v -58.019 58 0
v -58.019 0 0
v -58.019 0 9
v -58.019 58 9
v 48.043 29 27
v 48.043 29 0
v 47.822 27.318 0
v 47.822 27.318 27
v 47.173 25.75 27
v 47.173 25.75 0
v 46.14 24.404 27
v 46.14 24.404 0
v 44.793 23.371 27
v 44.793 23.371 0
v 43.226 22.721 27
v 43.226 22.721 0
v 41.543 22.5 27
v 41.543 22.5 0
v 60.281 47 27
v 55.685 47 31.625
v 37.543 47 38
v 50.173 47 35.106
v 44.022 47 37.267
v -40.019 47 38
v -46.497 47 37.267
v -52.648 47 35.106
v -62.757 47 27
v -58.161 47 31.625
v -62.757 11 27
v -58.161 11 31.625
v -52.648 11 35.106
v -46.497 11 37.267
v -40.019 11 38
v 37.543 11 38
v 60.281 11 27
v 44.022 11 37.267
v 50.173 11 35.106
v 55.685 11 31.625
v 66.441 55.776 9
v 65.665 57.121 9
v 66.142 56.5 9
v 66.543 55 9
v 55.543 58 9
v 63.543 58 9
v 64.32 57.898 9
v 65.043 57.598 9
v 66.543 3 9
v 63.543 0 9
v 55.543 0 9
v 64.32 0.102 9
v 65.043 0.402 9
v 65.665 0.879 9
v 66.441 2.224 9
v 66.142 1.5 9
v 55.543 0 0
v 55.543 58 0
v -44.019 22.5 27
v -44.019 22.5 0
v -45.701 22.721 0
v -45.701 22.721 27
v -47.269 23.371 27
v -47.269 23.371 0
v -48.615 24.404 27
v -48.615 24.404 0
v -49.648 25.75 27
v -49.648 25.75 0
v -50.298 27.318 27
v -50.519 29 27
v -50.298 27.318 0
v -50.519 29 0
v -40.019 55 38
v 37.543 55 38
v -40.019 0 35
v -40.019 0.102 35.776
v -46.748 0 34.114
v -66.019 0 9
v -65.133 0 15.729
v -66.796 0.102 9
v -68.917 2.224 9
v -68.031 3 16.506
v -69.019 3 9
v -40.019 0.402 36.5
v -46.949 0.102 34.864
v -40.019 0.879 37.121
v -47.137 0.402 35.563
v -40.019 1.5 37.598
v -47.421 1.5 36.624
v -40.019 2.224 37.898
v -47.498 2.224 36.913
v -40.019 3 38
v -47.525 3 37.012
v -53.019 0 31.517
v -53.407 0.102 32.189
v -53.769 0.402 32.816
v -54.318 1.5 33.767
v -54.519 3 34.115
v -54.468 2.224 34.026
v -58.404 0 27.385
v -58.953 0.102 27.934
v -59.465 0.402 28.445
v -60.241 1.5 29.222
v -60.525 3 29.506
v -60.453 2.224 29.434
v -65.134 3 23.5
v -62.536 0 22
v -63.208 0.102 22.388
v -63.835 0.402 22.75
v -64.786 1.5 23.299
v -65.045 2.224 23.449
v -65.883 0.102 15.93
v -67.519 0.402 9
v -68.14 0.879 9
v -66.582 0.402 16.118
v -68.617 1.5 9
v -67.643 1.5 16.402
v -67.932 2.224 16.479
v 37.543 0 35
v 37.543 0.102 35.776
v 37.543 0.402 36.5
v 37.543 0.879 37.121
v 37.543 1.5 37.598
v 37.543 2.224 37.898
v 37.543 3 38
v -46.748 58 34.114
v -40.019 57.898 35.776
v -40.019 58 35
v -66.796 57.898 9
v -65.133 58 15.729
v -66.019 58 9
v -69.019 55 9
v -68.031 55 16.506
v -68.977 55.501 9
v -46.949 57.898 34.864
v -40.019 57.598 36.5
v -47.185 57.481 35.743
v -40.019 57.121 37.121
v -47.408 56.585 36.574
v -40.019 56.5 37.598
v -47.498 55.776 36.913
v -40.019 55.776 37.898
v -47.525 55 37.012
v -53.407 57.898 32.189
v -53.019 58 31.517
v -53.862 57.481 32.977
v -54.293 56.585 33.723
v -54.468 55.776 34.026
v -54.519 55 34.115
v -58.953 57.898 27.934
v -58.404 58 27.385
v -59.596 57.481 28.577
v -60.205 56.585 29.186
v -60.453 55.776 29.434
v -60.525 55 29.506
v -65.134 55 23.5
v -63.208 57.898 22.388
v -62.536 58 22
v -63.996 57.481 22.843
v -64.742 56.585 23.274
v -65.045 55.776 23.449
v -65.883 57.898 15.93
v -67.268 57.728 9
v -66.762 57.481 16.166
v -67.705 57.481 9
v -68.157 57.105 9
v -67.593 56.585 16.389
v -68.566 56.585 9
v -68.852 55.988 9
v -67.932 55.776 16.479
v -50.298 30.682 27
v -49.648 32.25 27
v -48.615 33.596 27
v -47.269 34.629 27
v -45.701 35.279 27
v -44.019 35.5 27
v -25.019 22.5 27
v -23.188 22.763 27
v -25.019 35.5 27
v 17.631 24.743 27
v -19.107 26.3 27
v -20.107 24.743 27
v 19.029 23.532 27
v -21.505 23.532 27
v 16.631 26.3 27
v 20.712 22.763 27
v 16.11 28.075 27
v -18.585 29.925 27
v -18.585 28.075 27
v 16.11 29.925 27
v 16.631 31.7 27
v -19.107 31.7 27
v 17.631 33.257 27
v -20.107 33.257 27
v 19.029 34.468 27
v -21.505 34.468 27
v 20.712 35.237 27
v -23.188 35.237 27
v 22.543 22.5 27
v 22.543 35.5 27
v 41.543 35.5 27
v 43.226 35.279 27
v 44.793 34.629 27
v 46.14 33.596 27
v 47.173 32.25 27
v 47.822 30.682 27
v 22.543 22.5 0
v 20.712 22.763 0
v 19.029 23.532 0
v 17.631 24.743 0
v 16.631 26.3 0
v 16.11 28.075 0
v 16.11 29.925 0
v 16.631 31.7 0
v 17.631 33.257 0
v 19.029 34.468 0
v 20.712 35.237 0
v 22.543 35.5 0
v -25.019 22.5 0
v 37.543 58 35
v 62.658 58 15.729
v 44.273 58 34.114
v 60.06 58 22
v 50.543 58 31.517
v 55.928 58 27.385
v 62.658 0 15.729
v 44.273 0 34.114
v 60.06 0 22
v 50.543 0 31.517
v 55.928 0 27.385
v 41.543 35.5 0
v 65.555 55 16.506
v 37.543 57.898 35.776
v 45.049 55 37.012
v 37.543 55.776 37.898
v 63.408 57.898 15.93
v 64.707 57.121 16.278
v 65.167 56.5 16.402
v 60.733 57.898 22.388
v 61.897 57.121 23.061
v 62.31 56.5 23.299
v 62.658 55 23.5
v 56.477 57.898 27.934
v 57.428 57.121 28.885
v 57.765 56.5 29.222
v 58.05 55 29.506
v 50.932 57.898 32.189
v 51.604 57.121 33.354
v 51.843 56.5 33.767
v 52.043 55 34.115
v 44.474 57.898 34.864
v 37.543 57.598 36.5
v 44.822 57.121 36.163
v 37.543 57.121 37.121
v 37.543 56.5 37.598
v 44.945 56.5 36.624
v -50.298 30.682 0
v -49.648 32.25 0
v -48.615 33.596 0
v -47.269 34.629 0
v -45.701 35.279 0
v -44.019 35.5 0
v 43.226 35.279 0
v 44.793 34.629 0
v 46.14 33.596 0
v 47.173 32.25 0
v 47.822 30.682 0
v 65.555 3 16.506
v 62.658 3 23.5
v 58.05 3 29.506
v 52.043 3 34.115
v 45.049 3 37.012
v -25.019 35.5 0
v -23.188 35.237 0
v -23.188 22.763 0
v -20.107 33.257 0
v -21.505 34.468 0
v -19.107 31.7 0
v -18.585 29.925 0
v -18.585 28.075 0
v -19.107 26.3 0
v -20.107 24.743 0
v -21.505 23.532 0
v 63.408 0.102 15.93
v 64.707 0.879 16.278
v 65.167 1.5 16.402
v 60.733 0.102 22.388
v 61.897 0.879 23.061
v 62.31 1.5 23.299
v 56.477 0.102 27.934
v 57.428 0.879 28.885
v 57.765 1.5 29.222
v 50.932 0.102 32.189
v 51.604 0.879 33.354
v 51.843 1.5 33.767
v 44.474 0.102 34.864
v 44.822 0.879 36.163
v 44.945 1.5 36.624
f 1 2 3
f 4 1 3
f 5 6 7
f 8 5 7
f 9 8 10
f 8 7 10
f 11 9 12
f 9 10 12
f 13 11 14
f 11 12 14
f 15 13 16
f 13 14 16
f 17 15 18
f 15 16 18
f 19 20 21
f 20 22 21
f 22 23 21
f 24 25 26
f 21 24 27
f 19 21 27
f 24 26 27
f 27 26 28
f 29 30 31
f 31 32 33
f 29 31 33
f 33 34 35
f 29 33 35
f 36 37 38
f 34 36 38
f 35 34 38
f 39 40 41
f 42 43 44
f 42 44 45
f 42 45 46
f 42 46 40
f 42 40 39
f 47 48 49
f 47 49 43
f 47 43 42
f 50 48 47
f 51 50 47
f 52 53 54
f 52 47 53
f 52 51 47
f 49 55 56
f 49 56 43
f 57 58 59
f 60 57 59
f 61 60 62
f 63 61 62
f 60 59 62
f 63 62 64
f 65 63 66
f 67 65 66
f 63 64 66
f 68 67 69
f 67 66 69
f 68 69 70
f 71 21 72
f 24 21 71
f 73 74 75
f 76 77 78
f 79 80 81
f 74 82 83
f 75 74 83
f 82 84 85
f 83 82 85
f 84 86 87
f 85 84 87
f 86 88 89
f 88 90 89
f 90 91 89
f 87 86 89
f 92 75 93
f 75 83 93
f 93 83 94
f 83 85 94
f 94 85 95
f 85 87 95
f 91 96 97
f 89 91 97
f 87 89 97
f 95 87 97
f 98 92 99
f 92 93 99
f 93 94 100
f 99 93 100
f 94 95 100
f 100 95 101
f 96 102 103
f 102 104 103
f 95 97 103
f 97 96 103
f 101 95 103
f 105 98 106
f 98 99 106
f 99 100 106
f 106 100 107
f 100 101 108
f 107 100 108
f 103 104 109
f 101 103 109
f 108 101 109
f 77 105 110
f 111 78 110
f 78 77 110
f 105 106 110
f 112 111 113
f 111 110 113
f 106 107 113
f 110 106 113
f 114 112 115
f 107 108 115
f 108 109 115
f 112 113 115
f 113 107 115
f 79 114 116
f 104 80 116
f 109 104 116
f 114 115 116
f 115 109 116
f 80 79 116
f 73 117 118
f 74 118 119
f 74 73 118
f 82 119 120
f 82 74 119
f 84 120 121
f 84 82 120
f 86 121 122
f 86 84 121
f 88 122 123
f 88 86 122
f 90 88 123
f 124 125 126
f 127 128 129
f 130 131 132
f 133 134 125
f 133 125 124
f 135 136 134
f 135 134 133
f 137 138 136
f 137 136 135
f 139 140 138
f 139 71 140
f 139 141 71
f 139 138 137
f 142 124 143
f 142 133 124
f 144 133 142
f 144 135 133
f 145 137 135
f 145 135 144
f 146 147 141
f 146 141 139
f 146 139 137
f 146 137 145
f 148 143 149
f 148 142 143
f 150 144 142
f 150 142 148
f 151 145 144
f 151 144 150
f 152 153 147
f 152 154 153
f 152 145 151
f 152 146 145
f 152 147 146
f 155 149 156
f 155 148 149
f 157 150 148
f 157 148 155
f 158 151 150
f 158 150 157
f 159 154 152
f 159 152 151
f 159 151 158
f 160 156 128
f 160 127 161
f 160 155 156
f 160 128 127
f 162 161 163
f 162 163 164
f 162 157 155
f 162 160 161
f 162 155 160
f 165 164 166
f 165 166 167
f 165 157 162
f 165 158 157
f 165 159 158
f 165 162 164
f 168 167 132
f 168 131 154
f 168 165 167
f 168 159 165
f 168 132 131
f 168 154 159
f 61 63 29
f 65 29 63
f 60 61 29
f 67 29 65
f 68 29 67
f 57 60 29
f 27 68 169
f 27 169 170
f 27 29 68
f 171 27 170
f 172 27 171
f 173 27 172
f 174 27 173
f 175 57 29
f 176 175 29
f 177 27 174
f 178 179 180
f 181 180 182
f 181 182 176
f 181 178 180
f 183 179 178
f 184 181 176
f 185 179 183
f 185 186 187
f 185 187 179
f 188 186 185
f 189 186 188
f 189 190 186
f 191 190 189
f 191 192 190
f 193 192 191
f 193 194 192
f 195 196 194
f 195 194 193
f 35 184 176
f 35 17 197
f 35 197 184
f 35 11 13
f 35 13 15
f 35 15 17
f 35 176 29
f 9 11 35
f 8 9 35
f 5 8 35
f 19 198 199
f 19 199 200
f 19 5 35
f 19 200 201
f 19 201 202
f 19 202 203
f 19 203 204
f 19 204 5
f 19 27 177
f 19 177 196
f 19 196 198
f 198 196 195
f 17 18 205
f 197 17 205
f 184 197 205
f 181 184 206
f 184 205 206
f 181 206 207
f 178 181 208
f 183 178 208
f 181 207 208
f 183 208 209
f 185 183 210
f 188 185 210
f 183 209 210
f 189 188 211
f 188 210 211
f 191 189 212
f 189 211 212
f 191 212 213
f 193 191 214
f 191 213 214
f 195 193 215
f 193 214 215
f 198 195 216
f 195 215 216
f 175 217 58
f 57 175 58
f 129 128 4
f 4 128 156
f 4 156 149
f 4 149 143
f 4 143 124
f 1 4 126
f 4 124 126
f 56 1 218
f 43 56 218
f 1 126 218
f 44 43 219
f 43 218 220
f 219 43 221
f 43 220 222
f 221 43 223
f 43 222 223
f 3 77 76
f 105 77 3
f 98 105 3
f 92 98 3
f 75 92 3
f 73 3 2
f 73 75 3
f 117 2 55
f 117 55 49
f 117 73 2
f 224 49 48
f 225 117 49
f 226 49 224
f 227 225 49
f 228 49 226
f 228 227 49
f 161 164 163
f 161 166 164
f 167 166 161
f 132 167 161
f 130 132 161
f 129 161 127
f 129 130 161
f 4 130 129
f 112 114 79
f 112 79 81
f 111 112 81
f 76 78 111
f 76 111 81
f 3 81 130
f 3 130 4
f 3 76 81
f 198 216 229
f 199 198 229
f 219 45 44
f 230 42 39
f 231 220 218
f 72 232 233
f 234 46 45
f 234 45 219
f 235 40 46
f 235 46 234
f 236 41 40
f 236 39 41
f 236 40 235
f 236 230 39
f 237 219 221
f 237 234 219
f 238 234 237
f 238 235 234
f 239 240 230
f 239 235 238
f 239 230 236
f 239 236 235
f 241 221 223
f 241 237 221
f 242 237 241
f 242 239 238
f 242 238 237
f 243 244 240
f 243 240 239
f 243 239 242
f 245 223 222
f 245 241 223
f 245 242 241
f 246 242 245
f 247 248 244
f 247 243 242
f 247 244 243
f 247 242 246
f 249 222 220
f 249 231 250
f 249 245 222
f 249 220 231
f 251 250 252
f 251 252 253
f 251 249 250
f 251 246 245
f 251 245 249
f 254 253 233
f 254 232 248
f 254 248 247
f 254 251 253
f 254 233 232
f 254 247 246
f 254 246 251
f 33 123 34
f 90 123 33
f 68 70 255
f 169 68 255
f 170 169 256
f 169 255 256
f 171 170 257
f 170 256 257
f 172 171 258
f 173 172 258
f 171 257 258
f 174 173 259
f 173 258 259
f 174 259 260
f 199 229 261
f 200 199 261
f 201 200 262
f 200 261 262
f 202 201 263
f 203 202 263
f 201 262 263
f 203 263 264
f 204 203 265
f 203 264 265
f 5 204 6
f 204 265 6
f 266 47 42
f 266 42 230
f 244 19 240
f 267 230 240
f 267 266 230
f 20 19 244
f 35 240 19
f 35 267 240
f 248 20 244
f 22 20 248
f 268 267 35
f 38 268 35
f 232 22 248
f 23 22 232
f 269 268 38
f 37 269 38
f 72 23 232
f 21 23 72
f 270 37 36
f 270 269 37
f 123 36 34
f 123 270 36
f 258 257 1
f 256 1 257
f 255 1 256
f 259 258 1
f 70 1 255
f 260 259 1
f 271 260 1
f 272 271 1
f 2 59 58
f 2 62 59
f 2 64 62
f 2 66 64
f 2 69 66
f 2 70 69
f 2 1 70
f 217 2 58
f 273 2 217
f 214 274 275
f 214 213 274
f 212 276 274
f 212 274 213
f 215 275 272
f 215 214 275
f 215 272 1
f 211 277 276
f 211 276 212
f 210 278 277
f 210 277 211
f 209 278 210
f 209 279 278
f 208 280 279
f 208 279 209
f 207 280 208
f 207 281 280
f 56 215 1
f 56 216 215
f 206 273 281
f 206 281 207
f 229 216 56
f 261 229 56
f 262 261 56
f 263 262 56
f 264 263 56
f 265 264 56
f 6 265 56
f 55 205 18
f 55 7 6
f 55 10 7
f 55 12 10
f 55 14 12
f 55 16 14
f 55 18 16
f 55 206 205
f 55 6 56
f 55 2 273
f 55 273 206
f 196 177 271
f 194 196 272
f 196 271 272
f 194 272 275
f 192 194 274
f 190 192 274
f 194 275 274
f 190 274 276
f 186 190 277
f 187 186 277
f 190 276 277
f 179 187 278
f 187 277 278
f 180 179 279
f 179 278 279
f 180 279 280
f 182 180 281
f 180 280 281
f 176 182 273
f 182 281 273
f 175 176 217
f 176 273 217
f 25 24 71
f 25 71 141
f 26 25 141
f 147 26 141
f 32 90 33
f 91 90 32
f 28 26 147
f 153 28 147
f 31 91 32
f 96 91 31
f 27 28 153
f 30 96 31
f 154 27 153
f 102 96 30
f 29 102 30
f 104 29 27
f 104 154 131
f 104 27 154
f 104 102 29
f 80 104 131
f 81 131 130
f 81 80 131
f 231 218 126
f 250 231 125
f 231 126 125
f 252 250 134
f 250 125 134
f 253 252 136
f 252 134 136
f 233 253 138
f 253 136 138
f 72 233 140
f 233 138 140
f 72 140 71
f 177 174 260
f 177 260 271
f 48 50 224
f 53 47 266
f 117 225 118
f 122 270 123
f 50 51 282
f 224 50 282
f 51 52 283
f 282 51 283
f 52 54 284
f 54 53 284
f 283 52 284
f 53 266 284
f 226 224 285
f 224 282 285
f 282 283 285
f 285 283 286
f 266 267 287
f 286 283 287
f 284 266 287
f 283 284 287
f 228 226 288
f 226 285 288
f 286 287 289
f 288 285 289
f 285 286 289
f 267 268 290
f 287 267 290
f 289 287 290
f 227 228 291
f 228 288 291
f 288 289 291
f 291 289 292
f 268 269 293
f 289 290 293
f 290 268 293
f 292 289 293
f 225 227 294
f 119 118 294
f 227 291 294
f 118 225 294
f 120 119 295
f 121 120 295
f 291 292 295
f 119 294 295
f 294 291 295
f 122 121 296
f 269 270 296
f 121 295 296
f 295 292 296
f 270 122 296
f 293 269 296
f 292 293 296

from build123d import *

# Parameters (mm, degrees)
F0_W     = 8.562588
F0_H     = 9
F1_DEPTH = 58
F3_DEPTH = 11
F4_R     = 3
F6_DEPTH = 38.001


with BuildPart() as f1:
    # F0 (on Front) → F1 (new body)
    with BuildSketch(Plane.XZ):
        with BuildLine():
            Line((-49.456521, 9), (-49.456521, 0))
            Line((-49.456521, 0), (55.543479, 0))
            Line((55.543479, 0), (55.543479, 9))
            Line((55.543479, 9), (66.543479, 9))
            ThreePointArc((66.543479, 9), (58.049576, 29.506097), (37.543479, 38))
            Line((37.543479, 38), (-40.019109, 38))
            ThreePointArc((-40.019109, 38), (-60.525206, 29.506097), (-69.019109, 9))
            Line((-69.019109, 9), (-58.019109, 9))
            Line((-58.019109, 9), (-49.456521, 9))
        make_face()
        with Locations((-53.737815, 4.5)):
            Rectangle(F0_W, F0_H)
    extrude(amount=-F1_DEPTH)

    # F2 (on face) → F3 (cut)
    with BuildSketch(Plane.XY.offset(38)):
        Polygon((-64.201698, 11), (0, 11), (60.26233, 11), (64.404465, 11), (64.404465, 47), (60.26233, 47), (0, 47), (-64.201698, 47), align=None)
    extrude(amount=-F3_DEPTH, mode=Mode.SUBTRACT)

    # F4
    f4_edges = [f1.edges().sort_by_distance(p)[0] for p in [
        (-1.237815, 0, 38),
        (-1.237815, 58, 38),
        (-60.525206, 0, 29.506097),
        (58.049576, 0, 29.506097),
        (-60.525206, 58, 29.506097),
        (58.049576, 58, 29.506097),
    ]]
    fillet(f4_edges, radius=F4_R)

    # F5 (on face) → F6 (cut, through all)
    with BuildSketch(Plane(origin=(0, 0, 0), x_dir=(1, 0, 0), z_dir=(0, 0, -1))):
        with BuildLine():
            Line((-25.019109, -22.5), (-44.019109, -22.5))
            ThreePointArc((-44.019109, -22.5), (-48.615303, -24.403806), (-50.519109, -29))
            ThreePointArc((-50.519109, -29), (-48.615303, -33.596194), (-44.019109, -35.5))
            Line((-44.019109, -35.5), (-25.019109, -35.5))
            ThreePointArc((-25.019109, -35.5), (-18.519109, -29), (-25.019109, -22.5))
        make_face()
        with BuildLine():
            Line((41.543479, -22.5), (22.543479, -22.5))
            ThreePointArc((22.543479, -22.5), (16.043479, -29), (22.543479, -35.5))
            Line((22.543479, -35.5), (41.543479, -35.5))
            ThreePointArc((41.543479, -35.5), (46.139673, -33.596194), (48.043479, -29))
            ThreePointArc((48.043479, -29), (46.139673, -24.403806), (41.543479, -22.5))
        make_face()
    extrude(amount=-F6_DEPTH, mode=Mode.SUBTRACT)


solid = f1.part
